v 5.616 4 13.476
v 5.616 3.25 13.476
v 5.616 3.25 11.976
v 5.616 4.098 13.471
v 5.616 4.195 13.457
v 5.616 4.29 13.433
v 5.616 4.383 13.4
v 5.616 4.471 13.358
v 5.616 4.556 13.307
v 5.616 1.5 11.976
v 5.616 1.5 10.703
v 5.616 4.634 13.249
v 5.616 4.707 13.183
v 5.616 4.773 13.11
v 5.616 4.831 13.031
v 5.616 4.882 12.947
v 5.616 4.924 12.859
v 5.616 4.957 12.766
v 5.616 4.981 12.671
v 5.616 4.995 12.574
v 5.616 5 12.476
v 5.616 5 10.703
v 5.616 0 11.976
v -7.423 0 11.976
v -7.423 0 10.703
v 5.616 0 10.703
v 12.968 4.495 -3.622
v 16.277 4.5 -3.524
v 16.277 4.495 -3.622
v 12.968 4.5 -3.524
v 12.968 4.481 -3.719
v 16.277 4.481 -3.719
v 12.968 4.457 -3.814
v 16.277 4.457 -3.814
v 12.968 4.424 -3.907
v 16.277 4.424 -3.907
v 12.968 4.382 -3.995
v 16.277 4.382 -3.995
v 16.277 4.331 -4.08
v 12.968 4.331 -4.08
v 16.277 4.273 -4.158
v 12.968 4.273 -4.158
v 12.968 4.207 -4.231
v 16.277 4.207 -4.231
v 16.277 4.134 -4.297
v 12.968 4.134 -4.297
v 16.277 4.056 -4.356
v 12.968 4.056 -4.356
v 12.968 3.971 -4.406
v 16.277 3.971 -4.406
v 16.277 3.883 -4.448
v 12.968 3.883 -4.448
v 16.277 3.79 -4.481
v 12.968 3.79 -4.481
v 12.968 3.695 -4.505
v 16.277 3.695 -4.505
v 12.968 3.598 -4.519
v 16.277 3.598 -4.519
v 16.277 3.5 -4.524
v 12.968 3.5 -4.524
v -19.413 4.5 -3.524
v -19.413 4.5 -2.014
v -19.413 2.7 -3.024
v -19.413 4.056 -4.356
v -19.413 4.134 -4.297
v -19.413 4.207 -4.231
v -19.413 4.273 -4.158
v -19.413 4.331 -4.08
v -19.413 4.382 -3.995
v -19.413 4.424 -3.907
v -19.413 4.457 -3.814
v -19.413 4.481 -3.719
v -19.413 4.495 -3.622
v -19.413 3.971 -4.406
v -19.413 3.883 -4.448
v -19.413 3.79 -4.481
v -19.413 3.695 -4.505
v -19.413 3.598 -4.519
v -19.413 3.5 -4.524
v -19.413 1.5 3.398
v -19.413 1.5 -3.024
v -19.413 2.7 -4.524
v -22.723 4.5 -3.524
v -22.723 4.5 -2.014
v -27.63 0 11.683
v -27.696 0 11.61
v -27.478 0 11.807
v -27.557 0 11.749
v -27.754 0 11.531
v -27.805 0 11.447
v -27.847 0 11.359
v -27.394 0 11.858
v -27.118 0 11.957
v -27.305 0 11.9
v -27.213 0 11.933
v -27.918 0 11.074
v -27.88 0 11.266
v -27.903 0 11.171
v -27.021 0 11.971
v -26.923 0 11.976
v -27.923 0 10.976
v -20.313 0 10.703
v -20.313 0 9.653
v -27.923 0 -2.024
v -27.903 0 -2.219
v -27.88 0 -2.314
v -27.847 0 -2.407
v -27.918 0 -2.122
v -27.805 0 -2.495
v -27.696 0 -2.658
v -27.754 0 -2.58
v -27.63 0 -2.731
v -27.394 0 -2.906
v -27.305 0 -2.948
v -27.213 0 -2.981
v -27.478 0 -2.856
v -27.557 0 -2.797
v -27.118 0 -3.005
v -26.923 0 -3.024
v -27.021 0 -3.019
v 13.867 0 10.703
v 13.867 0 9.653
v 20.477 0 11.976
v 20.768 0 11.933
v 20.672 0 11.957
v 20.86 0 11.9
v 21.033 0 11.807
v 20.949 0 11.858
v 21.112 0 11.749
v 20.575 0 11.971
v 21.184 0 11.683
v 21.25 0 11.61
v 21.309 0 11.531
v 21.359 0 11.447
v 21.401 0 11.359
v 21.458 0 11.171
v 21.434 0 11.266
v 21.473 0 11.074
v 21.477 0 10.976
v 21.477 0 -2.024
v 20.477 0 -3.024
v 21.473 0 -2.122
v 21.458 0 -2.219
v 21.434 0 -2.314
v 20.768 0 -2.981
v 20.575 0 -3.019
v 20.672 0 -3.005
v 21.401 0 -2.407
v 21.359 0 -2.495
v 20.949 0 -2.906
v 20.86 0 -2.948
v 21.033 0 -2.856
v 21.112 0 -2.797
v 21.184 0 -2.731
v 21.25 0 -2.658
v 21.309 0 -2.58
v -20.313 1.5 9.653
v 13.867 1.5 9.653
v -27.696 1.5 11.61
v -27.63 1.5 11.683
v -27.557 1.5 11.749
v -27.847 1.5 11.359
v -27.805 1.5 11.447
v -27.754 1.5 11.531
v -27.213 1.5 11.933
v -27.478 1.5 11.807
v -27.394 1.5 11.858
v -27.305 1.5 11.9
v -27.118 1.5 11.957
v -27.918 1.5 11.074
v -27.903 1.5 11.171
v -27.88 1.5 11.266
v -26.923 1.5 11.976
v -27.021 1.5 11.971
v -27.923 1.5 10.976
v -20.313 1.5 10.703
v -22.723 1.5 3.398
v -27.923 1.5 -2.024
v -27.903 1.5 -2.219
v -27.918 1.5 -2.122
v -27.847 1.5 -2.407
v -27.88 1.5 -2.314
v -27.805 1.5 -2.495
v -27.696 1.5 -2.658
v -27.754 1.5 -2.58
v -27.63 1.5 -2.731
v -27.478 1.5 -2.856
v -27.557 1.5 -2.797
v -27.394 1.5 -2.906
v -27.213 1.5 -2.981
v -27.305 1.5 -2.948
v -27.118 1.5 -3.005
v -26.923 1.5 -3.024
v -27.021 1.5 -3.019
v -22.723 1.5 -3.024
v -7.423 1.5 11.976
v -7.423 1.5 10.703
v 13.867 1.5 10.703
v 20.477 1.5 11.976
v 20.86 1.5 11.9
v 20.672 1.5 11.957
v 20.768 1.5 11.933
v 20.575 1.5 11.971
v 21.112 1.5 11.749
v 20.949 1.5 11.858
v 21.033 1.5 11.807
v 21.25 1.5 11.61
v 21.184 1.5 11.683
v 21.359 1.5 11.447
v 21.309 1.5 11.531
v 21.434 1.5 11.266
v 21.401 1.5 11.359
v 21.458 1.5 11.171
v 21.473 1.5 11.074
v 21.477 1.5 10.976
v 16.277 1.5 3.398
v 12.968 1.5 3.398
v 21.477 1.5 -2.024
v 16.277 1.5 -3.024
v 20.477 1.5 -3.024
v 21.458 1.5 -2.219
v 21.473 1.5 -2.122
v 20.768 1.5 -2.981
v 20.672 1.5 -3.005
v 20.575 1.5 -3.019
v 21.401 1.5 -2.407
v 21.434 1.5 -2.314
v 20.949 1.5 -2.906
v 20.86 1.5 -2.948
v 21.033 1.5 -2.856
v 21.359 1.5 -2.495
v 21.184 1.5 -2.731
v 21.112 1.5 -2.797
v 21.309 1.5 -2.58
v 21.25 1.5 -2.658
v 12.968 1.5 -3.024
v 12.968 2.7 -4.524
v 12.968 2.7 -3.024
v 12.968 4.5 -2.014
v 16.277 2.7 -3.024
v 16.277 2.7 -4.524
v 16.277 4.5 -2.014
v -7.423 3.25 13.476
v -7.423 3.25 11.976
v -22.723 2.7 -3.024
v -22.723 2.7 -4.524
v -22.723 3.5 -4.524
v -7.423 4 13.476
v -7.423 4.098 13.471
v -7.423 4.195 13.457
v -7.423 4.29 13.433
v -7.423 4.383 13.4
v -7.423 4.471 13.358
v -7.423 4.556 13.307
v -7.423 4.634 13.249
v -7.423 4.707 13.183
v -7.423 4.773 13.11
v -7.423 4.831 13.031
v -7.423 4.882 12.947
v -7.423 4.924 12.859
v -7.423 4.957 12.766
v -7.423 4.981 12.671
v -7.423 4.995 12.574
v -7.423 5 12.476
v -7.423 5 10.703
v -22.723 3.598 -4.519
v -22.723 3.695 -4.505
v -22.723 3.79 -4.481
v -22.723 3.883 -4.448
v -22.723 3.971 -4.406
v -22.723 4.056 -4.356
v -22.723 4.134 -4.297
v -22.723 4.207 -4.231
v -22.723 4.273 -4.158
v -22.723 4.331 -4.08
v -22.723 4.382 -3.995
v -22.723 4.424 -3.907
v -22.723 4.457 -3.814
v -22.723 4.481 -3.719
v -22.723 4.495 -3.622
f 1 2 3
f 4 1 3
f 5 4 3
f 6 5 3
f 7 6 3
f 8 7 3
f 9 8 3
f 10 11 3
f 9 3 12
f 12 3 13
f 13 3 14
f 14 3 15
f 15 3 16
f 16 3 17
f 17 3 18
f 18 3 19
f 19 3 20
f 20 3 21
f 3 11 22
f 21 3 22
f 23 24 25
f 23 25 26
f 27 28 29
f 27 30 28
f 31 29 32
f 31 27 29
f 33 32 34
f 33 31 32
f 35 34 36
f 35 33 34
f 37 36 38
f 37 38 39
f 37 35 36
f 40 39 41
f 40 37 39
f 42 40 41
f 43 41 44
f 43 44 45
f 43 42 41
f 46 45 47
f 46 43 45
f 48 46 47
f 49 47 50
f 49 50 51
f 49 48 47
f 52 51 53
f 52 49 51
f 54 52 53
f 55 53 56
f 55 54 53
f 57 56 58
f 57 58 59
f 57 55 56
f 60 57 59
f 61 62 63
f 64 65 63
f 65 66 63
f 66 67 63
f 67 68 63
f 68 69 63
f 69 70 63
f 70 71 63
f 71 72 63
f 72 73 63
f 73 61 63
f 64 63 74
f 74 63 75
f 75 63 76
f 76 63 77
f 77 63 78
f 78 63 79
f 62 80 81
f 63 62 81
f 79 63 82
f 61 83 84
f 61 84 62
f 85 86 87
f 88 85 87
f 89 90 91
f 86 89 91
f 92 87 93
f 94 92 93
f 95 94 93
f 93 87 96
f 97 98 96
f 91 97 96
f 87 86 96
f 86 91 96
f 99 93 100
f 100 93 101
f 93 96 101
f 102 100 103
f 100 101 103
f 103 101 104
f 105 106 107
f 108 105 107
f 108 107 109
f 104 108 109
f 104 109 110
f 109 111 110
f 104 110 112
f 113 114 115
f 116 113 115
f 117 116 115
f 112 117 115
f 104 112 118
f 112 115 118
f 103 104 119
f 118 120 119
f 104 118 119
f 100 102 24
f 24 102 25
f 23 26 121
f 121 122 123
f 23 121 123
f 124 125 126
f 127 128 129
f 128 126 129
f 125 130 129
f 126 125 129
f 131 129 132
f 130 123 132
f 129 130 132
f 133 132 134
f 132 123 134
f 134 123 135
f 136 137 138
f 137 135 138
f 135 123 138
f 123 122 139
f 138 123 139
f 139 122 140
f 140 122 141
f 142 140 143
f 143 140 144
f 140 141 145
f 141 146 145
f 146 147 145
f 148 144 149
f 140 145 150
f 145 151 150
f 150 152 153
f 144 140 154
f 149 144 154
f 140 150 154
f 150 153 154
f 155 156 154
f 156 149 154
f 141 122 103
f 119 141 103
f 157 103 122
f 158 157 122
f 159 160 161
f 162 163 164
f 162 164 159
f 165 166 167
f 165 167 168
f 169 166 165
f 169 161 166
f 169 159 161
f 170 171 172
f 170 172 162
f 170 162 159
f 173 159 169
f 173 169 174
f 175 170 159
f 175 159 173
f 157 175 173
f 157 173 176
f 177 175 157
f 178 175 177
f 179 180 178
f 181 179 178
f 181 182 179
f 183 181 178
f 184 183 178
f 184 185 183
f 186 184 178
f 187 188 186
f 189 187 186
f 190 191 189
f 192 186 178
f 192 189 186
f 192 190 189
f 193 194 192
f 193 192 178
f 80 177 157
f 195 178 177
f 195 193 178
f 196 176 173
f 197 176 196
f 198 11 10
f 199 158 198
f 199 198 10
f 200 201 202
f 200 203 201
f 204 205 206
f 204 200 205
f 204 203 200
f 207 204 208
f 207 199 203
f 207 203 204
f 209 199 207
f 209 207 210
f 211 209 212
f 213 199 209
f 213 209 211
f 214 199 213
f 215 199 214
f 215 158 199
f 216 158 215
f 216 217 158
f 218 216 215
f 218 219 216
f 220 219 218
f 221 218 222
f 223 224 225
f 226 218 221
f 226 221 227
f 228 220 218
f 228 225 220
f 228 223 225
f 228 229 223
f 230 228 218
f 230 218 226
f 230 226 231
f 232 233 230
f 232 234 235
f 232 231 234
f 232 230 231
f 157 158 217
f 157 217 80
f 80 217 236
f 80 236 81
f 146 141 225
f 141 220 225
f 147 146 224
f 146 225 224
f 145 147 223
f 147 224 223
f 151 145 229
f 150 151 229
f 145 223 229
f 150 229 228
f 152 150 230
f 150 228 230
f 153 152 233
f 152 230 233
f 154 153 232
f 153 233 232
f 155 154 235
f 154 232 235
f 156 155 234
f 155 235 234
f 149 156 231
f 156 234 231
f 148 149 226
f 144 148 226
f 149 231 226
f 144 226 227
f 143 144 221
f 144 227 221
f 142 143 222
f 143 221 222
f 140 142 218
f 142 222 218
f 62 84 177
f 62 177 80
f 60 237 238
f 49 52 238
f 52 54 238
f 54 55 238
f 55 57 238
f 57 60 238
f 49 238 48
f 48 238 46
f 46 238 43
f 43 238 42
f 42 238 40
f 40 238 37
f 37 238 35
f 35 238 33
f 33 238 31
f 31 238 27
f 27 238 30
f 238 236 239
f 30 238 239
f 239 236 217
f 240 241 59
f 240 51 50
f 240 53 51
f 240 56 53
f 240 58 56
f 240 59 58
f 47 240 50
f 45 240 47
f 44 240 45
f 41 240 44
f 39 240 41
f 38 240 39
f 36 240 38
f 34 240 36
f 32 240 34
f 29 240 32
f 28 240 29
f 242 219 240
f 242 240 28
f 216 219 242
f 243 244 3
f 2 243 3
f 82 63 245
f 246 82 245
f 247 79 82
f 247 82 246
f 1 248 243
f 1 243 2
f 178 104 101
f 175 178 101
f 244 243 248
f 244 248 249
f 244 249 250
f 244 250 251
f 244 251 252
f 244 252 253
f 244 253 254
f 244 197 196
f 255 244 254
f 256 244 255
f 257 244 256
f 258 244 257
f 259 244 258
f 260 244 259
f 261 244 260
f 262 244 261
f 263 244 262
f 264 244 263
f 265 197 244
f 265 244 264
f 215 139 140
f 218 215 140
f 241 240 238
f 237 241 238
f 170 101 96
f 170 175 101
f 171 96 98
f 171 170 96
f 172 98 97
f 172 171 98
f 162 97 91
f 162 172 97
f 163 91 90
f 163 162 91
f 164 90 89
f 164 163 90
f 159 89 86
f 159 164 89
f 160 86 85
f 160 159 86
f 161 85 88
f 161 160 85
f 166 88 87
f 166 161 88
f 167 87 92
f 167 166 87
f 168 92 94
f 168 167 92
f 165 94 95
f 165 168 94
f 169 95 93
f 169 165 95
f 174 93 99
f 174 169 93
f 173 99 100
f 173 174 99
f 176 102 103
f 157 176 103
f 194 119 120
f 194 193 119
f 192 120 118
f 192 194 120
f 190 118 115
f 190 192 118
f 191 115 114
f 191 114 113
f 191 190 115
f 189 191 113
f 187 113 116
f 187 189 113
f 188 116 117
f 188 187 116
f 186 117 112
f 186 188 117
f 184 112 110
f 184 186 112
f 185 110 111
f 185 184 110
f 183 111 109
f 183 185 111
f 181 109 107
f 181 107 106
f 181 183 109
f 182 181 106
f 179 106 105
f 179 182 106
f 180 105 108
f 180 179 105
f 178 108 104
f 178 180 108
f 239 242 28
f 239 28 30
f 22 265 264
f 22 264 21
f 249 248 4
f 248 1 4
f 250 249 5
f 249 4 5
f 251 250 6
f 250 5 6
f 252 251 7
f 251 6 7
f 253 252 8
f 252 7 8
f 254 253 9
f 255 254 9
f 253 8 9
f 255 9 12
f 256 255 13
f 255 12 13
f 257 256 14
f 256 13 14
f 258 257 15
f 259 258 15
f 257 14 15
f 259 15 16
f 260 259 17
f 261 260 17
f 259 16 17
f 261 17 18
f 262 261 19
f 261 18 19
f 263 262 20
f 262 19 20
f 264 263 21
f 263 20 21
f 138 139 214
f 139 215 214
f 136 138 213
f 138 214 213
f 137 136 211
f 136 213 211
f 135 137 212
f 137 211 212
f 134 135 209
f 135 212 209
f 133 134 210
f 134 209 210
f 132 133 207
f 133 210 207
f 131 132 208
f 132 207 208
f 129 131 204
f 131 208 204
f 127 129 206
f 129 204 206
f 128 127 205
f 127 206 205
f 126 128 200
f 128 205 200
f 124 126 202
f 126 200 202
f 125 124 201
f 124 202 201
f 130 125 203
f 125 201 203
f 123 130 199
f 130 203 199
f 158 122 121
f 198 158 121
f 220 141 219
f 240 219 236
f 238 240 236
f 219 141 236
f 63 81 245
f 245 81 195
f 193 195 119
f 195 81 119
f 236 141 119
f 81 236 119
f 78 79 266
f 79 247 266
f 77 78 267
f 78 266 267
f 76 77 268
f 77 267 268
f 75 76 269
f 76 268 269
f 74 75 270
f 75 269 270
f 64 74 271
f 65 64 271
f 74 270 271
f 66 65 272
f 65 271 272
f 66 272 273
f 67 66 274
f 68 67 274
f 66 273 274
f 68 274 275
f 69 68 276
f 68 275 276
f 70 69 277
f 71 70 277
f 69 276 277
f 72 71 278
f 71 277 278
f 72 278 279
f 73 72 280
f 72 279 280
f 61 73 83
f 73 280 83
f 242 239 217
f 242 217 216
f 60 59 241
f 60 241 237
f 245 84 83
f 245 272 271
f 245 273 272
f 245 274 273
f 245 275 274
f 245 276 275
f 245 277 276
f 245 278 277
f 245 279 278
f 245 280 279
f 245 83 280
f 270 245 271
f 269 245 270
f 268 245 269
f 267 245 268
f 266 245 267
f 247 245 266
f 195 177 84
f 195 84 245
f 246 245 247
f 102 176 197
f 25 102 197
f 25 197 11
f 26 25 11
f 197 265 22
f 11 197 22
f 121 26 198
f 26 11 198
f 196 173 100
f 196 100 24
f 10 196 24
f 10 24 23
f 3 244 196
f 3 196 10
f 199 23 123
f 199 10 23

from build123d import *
from OCP.BRepFilletAPI import BRepFilletAPI_MakeChamfer

# Parameters (mm, degrees)
SKETCH1_W                 = 5
SKETCH1_H                 = 1.629773482
SKETCH1_H_2               = 1.605700765
BOSS_EXTRUDE21_DEPTH      = 1.5
BOSS_EXTRUDE22_DEPTH      = 0.0001
BOSS_EXTRUDE22_DEPTH_BACK = 5
SKETCH4_W                 = 13.038345926
SKETCH4_H                 = 1.27322458
SKETCH5_W                 = 13.038345926
SKETCH5_H                 = 1.75
BOSS_EXTRUDE23_DEPTH      = 1.5
SKETCH6_W                 = 3.309716912
SKETCH6_H                 = 6.42211522
SKETCH6_W_2               = 3.309716913
BOSS_EXTRUDE24_DEPTH      = 3
SKETCH8_W                 = 3.309716912
SKETCH8_H                 = 1.8
SKETCH8_W_2               = 3.309716913
BOSS_EXTRUDE26_DEPTH      = 1.5
FILLET1_R                 = 1
FILLET2_R                 = 1
CHAMFER1_SIZE             = 3
CHAMFER1_SIZE_2           = 5.412143266


with BuildPart() as part:
    # Sketch1 → Boss-Extrude21 (new body)
    # profile 1 of 3: a face of its own
    with BuildSketch(Plane(origin=(0, 0, 0), x_dir=(1, 0, 0), z_dir=(0, 1, 0))):
        with Locations((9.977336143, 2.209185976)):
            Rectangle(SKETCH1_W, SKETCH1_H)
    # profile 2 of 3: a face of its own
    with BuildSketch(Plane(origin=(0, 0, 0), x_dir=(1, 0, 0), z_dir=(0, 1, 0))):
        Polygon((-7.422672964, -10.702702703), (-20.313450574, -10.702702703), (-20.313450574, -9.652730884), (13.867336143, -9.652730884), (13.867336143, -10.702702703), (0.977336143, -10.702702703), (0.977336143, -11.975927283), (21.477336143, -11.975927283), (21.477336143, 3.024072717), (12.477336143, 3.024072717), (12.477336143, 1.394299235), (7.477336143, 1.394299235), (7.477336143, 3.024072717), (-27.922663857, 3.024072717), (-27.922663857, -11.975927283), (-7.422672964, -11.975927283), align=None)
        with Locations((-16.422663857, 2.186483824)):
            Rectangle(SKETCH1_W, SKETCH1_H_2, mode=Mode.SUBTRACT)
    # profile 3 of 3: a face of its own
    with BuildSketch(Plane(origin=(0, 0, 0), x_dir=(1, 0, 0), z_dir=(0, 1, 0))):
        with Locations((-16.422663857, 2.186483824)):
            Rectangle(SKETCH1_W, SKETCH1_H_2)
    extrude(amount=BOSS_EXTRUDE21_DEPTH)

    # Sketch4 → Boss-Extrude22 (add, two sides: drawn at the far end of the back side and taken through both)
    with BuildSketch(Plane.XZ.offset(-BOSS_EXTRUDE22_DEPTH_BACK)):
        with Locations((-0.903500001, 11.339314993)):
            Rectangle(SKETCH4_W, SKETCH4_H)
    extrude(amount=BOSS_EXTRUDE22_DEPTH + BOSS_EXTRUDE22_DEPTH_BACK)

    # Sketch5 → Boss-Extrude23 (add)
    with BuildSketch(Plane.XY.offset(11.975927283)):
        with Locations((-0.903500001, 4.125)):
            Rectangle(SKETCH5_W, SKETCH5_H)
    extrude(amount=BOSS_EXTRUDE23_DEPTH)

    # Sketch6 → Boss-Extrude24 (add)
    with BuildSketch(Plane(origin=(0, 1.5, 0), x_dir=(1, 0, 0), z_dir=(0, 1, 0))):
        with Locations((14.622477687, -0.186984893)):
            Rectangle(SKETCH6_W, SKETCH6_H)
        with Locations((-21.0678054, -0.186984893)):
            Rectangle(SKETCH6_W_2, SKETCH6_H)
    extrude(amount=BOSS_EXTRUDE24_DEPTH)

    # Sketch8 → Boss-Extrude26 (add)
    with BuildSketch(Plane(origin=(0, 0, -3.024072717), x_dir=(-1, 0, 0), z_dir=(0, 0, -1))):
        with Locations((-14.622477687, 3.6)):
            Rectangle(SKETCH8_W, SKETCH8_H)
        with Locations((21.0678054, 3.6)):
            Rectangle(SKETCH8_W_2, SKETCH8_H)
    extrude(amount=BOSS_EXTRUDE26_DEPTH)

    # Fillet1
    fillet1_edges = [part.edges().sort_by_distance(p)[0] for p in [
        (14.622477687, 4.5, -4.524072717),
        (-21.0678054, 4.5, -4.524072717),
        (-0.903500001, 5, 13.475927283),
    ]]
    fillet(fillet1_edges, radius=FILLET1_R)

    # Fillet2
    fillet2_edges = [part.edges().sort_by_distance(p)[0] for p in [
        (21.477336143, 0.75, 11.975927283),
        (-27.922663857, 0.75, 11.975927283),
        (-27.922663857, 0.75, -3.024072717),
        (21.477336143, 0.75, -3.024072717),
    ]]
    fillet(fillet2_edges, radius=FILLET2_R)

    # Chamfer1
    chamfer1_edges_1 = [part.edges().sort_by_distance(p)[0] for p in [
        (14.622477687, 4.5, 3.398042503),
    ]]
    chamfer1_side_1 = [part.faces().sort_by_distance(p)[0] for p in [
        (14.622477687, 4.44, 3.398042503),
    ]]
    chamfer1_edges_2 = [part.edges().sort_by_distance(p)[0] for p in [
        (-21.0678054, 4.5, 3.398042503),
    ]]
    chamfer1_side_2 = [part.faces().sort_by_distance(p)[0] for p in [
        (-21.0678054, 4.44, 3.398042503),
    ]]
    chamfer1 = BRepFilletAPI_MakeChamfer(part.part.solid().wrapped)
    for e in chamfer1_edges_1:
        chamfer1.Add(CHAMFER1_SIZE - 0.0001, CHAMFER1_SIZE_2 - 0.0001, e.wrapped, chamfer1_side_1[0].wrapped)
    for e in chamfer1_edges_2:
        chamfer1.Add(CHAMFER1_SIZE - 0.0001, CHAMFER1_SIZE_2 - 0.0001, e.wrapped, chamfer1_side_2[0].wrapped)
    add(Compound.cast(chamfer1.Shape()), mode=Mode.REPLACE)  # a hair under: the kernel refuses the full size


solid = part.part
